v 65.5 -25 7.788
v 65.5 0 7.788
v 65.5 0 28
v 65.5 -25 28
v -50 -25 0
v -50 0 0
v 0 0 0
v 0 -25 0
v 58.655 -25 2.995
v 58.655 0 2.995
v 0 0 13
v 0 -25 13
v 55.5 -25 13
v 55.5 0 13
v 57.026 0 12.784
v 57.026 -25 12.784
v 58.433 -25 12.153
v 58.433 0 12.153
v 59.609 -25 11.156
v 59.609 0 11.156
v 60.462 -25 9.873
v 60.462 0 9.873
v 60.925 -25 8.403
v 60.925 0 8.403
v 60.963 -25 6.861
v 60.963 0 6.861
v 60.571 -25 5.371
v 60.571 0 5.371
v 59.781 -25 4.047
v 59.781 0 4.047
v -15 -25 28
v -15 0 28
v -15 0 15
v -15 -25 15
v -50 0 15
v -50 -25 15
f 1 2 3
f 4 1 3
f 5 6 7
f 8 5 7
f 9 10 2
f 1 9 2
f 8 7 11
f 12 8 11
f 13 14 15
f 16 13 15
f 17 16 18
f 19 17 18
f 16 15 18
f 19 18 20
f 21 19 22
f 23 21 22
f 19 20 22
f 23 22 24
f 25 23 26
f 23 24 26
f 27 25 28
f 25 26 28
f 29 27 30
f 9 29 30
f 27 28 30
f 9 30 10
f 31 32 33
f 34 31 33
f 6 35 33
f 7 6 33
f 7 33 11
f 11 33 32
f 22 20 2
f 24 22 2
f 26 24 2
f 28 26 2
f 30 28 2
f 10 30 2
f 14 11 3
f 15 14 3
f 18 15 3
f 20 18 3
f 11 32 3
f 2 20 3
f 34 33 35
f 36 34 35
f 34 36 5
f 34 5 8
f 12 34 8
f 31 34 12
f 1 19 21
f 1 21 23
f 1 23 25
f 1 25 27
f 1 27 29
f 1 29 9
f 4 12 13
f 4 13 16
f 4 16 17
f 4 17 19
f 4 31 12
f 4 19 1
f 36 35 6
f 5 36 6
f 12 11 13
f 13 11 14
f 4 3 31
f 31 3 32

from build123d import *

# Parameters (mm, degrees)
F1_DEPTH = 25


with BuildPart() as f1:
    # F0 (on Front) → F1 (new body)
    with BuildSketch(Plane.XZ):
        with BuildLine():
            Line((-50, 15), (-50, 0))
            Line((-50, 0), (0, 0))
            Line((0, 0), (0, 13))
            Line((0, 13), (55.5, 13))
            ThreePointArc((55.5, 13), (60.745443, 9.153882), (58.65467, 2.994664))
            Line((58.65467, 2.994664), (65.5, 7.787815))
            Line((65.5, 7.787815), (65.5, 28))
            Line((65.5, 28), (-15, 28))
            Line((-15, 28), (-15, 15))
            Line((-15, 15), (-50, 15))
        make_face()
    extrude(amount=F1_DEPTH)


solid = f1.part
